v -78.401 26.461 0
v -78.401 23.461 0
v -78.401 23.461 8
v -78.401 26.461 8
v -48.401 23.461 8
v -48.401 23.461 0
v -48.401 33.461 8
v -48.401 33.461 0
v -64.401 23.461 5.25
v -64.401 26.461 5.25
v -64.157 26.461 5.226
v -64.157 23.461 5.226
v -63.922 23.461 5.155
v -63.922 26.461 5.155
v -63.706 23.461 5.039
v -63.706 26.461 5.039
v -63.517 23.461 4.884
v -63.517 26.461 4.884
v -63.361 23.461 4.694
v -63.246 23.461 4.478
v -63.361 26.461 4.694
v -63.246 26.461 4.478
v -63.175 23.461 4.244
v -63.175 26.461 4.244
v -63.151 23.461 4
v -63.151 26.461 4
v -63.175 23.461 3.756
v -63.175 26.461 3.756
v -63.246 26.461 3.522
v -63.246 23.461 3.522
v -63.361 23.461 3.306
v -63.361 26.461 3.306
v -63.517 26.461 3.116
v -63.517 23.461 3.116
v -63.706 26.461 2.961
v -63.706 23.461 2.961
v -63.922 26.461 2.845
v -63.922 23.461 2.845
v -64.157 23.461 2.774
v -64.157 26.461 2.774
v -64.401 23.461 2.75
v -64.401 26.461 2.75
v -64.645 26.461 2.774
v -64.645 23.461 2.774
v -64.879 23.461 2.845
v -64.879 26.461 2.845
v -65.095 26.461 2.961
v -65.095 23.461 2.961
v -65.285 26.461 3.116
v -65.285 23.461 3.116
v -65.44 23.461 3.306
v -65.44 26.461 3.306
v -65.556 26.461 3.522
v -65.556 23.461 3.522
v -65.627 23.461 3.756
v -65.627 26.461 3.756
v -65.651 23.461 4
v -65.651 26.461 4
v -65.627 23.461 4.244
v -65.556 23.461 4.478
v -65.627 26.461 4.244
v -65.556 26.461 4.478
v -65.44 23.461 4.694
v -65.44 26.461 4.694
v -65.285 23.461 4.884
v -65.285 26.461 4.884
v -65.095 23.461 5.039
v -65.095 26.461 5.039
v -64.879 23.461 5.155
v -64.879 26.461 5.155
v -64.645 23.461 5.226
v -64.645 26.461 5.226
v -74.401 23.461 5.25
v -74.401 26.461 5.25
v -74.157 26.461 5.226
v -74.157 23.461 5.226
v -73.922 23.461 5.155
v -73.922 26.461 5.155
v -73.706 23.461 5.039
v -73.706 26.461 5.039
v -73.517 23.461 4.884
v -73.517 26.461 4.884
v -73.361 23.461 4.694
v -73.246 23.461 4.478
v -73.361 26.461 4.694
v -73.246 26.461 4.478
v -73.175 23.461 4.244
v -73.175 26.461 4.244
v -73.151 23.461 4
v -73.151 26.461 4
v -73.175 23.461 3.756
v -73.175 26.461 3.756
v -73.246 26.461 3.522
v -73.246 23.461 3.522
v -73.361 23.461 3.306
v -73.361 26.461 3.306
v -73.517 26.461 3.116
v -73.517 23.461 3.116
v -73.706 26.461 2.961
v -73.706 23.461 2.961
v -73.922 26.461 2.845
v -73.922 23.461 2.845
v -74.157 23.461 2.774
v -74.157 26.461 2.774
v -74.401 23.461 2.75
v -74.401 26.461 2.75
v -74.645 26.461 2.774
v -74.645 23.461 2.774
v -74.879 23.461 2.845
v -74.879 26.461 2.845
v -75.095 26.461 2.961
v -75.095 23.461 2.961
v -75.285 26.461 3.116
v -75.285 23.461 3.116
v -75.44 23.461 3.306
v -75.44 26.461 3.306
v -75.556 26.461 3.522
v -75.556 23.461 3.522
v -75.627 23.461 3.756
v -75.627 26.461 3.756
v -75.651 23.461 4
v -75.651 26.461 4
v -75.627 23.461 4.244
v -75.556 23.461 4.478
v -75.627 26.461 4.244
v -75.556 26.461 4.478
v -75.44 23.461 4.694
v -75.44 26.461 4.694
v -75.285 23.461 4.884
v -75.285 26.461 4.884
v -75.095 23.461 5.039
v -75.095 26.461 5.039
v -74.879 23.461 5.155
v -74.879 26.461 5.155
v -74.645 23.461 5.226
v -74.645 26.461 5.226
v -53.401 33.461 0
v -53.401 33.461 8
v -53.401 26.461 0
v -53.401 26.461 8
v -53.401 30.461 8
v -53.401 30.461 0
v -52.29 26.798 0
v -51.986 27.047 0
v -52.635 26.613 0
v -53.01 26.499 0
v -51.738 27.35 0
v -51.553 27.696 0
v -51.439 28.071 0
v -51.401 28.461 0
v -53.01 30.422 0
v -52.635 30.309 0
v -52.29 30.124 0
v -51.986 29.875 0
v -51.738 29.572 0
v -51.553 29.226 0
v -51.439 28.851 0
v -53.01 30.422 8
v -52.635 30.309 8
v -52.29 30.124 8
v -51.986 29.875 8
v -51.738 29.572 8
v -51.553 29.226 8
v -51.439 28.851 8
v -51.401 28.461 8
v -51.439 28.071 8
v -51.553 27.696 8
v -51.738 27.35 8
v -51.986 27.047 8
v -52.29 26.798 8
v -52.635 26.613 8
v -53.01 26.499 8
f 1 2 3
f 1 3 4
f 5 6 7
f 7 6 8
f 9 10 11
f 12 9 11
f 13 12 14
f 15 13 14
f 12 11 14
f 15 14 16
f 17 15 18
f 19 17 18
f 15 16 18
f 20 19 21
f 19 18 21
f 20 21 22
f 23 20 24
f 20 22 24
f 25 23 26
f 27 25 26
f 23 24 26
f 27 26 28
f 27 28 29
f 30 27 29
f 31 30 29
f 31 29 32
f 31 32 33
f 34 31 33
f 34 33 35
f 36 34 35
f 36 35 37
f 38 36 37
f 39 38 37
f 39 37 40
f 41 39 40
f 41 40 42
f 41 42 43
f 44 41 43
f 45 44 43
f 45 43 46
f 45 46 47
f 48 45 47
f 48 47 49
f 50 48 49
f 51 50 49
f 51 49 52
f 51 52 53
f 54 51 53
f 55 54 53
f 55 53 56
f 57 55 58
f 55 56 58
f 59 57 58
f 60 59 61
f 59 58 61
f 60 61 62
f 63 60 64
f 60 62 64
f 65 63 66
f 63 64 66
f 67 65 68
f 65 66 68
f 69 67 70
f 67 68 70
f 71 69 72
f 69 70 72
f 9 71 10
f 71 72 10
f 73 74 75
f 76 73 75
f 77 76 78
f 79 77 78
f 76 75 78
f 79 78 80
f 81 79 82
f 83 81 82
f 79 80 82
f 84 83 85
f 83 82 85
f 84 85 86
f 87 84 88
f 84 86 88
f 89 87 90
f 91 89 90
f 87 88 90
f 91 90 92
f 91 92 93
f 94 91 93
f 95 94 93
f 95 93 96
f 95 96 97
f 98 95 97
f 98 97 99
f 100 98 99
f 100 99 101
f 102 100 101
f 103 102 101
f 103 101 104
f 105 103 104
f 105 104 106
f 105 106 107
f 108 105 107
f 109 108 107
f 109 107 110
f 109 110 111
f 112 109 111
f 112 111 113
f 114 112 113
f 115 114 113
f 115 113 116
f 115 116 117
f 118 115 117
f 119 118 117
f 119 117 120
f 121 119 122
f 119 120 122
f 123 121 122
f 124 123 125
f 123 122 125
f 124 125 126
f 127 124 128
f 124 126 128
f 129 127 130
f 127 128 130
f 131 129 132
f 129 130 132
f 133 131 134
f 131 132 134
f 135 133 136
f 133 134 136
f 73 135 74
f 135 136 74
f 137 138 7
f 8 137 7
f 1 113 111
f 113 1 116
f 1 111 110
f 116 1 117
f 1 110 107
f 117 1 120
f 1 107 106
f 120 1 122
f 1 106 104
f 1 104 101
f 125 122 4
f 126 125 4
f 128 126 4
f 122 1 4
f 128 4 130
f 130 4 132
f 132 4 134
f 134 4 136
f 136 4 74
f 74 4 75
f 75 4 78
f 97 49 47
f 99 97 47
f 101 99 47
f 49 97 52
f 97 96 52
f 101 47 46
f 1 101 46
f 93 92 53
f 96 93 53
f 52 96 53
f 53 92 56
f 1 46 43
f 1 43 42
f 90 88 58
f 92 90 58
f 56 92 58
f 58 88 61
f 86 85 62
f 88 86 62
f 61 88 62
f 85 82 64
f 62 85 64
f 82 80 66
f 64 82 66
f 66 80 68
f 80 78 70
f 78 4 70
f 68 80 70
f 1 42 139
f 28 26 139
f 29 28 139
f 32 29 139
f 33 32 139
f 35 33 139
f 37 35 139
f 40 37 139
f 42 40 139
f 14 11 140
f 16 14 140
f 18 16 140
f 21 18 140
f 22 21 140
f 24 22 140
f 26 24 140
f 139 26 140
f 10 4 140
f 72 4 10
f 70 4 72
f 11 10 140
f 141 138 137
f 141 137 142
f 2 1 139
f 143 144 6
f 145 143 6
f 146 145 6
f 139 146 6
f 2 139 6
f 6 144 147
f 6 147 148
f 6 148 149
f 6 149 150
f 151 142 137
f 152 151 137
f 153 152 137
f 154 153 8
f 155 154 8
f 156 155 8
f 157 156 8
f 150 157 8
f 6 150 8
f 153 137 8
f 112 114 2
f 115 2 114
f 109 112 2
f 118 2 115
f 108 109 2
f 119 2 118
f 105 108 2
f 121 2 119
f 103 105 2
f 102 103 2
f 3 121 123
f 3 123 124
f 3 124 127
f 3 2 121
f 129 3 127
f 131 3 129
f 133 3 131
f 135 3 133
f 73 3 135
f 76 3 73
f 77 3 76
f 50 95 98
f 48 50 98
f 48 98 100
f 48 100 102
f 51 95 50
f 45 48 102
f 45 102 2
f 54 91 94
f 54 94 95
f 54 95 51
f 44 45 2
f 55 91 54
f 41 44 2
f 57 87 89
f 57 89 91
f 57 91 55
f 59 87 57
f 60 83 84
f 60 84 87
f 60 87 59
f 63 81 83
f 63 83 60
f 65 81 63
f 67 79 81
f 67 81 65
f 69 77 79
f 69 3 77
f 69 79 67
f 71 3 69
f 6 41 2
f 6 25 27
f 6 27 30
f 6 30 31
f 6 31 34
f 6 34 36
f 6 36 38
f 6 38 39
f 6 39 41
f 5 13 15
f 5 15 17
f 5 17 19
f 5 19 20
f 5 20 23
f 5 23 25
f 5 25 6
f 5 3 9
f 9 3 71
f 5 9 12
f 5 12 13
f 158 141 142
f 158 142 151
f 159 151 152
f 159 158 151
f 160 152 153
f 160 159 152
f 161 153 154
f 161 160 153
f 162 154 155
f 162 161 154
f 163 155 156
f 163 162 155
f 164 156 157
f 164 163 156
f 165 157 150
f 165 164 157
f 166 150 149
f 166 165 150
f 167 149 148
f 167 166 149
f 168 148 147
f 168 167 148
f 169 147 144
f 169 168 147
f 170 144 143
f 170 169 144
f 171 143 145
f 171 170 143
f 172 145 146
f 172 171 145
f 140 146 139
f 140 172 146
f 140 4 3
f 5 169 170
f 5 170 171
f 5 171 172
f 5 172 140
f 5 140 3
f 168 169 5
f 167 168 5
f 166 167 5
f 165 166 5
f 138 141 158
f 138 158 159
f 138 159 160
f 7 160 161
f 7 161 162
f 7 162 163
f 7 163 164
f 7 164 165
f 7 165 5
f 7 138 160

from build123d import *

# Parameters (mm, degrees)
SKETCH1_W           = 20
SKETCH1_H           = 10
BOSS_EXTRUDE1_DEPTH = 8
CUT_EXTRUDE2_DEPTH  = 8
SKETCH3_W           = 10
SKETCH3_H           = 3
BOSS_EXTRUDE2_DEPTH = 8
SKETCH4_R           = 1.25
CUT_EXTRUDE3_DEPTH  = 8
SKETCH5_R           = 1.25
CUT_EXTRUDE4_DEPTH  = 8


with BuildPart() as part:
    # Sketch1 → Boss-Extrude1 (new body)
    with BuildSketch(Plane.XY):
        with Locations((-58.400678179, 28.460872298)):
            Rectangle(SKETCH1_W, SKETCH1_H)
    extrude(amount=BOSS_EXTRUDE1_DEPTH)

    # Sketch2 → Cut-Extrude2 (cut)
    with BuildSketch(Plane.XY.offset(8)):
        with BuildLine():
            Line((-53.400678179, 33.460872298), (-53.400678179, 30.460872298))
            ThreePointArc((-53.400678179, 30.460872298), (-51.400678179, 28.460872298), (-53.400678179, 26.460872298))
            Line((-53.400678179, 26.460872298), (-68.400678179, 26.460872298))
            Line((-68.400678179, 26.460872298), (-68.400678179, 33.460872298))
            Line((-68.400678179, 33.460872298), (-53.400678179, 33.460872298))
        make_face()
    extrude(amount=-CUT_EXTRUDE2_DEPTH, mode=Mode.SUBTRACT)

    # Sketch3 → Boss-Extrude2 (add)
    with BuildSketch(Plane.XY.offset(8)):
        with Locations((-73.400678179, 24.960872298)):
            Rectangle(SKETCH3_W, SKETCH3_H)
    extrude(amount=-BOSS_EXTRUDE2_DEPTH)

    # Sketch4 → Cut-Extrude3 (cut)
    with BuildSketch(Plane(origin=(0, 26.460872298, 0), x_dir=(1, 0, 0), z_dir=(0, 1, 0))):
        with Locations(Location((-74.400678179, -4, 0), (0, 0, 270))):
            Circle(SKETCH4_R)
    extrude(amount=-CUT_EXTRUDE3_DEPTH, mode=Mode.SUBTRACT)

    # Sketch5 → Cut-Extrude4 (cut)
    with BuildSketch(Plane(origin=(0, 26.460872298, 0), x_dir=(1, 0, 0), z_dir=(0, 1, 0))):
        with Locations(Location((-64.400678179, -4, 0), (0, 0, 270))):
            Circle(SKETCH5_R)
    extrude(amount=-CUT_EXTRUDE4_DEPTH, mode=Mode.SUBTRACT)


solid = part.part
